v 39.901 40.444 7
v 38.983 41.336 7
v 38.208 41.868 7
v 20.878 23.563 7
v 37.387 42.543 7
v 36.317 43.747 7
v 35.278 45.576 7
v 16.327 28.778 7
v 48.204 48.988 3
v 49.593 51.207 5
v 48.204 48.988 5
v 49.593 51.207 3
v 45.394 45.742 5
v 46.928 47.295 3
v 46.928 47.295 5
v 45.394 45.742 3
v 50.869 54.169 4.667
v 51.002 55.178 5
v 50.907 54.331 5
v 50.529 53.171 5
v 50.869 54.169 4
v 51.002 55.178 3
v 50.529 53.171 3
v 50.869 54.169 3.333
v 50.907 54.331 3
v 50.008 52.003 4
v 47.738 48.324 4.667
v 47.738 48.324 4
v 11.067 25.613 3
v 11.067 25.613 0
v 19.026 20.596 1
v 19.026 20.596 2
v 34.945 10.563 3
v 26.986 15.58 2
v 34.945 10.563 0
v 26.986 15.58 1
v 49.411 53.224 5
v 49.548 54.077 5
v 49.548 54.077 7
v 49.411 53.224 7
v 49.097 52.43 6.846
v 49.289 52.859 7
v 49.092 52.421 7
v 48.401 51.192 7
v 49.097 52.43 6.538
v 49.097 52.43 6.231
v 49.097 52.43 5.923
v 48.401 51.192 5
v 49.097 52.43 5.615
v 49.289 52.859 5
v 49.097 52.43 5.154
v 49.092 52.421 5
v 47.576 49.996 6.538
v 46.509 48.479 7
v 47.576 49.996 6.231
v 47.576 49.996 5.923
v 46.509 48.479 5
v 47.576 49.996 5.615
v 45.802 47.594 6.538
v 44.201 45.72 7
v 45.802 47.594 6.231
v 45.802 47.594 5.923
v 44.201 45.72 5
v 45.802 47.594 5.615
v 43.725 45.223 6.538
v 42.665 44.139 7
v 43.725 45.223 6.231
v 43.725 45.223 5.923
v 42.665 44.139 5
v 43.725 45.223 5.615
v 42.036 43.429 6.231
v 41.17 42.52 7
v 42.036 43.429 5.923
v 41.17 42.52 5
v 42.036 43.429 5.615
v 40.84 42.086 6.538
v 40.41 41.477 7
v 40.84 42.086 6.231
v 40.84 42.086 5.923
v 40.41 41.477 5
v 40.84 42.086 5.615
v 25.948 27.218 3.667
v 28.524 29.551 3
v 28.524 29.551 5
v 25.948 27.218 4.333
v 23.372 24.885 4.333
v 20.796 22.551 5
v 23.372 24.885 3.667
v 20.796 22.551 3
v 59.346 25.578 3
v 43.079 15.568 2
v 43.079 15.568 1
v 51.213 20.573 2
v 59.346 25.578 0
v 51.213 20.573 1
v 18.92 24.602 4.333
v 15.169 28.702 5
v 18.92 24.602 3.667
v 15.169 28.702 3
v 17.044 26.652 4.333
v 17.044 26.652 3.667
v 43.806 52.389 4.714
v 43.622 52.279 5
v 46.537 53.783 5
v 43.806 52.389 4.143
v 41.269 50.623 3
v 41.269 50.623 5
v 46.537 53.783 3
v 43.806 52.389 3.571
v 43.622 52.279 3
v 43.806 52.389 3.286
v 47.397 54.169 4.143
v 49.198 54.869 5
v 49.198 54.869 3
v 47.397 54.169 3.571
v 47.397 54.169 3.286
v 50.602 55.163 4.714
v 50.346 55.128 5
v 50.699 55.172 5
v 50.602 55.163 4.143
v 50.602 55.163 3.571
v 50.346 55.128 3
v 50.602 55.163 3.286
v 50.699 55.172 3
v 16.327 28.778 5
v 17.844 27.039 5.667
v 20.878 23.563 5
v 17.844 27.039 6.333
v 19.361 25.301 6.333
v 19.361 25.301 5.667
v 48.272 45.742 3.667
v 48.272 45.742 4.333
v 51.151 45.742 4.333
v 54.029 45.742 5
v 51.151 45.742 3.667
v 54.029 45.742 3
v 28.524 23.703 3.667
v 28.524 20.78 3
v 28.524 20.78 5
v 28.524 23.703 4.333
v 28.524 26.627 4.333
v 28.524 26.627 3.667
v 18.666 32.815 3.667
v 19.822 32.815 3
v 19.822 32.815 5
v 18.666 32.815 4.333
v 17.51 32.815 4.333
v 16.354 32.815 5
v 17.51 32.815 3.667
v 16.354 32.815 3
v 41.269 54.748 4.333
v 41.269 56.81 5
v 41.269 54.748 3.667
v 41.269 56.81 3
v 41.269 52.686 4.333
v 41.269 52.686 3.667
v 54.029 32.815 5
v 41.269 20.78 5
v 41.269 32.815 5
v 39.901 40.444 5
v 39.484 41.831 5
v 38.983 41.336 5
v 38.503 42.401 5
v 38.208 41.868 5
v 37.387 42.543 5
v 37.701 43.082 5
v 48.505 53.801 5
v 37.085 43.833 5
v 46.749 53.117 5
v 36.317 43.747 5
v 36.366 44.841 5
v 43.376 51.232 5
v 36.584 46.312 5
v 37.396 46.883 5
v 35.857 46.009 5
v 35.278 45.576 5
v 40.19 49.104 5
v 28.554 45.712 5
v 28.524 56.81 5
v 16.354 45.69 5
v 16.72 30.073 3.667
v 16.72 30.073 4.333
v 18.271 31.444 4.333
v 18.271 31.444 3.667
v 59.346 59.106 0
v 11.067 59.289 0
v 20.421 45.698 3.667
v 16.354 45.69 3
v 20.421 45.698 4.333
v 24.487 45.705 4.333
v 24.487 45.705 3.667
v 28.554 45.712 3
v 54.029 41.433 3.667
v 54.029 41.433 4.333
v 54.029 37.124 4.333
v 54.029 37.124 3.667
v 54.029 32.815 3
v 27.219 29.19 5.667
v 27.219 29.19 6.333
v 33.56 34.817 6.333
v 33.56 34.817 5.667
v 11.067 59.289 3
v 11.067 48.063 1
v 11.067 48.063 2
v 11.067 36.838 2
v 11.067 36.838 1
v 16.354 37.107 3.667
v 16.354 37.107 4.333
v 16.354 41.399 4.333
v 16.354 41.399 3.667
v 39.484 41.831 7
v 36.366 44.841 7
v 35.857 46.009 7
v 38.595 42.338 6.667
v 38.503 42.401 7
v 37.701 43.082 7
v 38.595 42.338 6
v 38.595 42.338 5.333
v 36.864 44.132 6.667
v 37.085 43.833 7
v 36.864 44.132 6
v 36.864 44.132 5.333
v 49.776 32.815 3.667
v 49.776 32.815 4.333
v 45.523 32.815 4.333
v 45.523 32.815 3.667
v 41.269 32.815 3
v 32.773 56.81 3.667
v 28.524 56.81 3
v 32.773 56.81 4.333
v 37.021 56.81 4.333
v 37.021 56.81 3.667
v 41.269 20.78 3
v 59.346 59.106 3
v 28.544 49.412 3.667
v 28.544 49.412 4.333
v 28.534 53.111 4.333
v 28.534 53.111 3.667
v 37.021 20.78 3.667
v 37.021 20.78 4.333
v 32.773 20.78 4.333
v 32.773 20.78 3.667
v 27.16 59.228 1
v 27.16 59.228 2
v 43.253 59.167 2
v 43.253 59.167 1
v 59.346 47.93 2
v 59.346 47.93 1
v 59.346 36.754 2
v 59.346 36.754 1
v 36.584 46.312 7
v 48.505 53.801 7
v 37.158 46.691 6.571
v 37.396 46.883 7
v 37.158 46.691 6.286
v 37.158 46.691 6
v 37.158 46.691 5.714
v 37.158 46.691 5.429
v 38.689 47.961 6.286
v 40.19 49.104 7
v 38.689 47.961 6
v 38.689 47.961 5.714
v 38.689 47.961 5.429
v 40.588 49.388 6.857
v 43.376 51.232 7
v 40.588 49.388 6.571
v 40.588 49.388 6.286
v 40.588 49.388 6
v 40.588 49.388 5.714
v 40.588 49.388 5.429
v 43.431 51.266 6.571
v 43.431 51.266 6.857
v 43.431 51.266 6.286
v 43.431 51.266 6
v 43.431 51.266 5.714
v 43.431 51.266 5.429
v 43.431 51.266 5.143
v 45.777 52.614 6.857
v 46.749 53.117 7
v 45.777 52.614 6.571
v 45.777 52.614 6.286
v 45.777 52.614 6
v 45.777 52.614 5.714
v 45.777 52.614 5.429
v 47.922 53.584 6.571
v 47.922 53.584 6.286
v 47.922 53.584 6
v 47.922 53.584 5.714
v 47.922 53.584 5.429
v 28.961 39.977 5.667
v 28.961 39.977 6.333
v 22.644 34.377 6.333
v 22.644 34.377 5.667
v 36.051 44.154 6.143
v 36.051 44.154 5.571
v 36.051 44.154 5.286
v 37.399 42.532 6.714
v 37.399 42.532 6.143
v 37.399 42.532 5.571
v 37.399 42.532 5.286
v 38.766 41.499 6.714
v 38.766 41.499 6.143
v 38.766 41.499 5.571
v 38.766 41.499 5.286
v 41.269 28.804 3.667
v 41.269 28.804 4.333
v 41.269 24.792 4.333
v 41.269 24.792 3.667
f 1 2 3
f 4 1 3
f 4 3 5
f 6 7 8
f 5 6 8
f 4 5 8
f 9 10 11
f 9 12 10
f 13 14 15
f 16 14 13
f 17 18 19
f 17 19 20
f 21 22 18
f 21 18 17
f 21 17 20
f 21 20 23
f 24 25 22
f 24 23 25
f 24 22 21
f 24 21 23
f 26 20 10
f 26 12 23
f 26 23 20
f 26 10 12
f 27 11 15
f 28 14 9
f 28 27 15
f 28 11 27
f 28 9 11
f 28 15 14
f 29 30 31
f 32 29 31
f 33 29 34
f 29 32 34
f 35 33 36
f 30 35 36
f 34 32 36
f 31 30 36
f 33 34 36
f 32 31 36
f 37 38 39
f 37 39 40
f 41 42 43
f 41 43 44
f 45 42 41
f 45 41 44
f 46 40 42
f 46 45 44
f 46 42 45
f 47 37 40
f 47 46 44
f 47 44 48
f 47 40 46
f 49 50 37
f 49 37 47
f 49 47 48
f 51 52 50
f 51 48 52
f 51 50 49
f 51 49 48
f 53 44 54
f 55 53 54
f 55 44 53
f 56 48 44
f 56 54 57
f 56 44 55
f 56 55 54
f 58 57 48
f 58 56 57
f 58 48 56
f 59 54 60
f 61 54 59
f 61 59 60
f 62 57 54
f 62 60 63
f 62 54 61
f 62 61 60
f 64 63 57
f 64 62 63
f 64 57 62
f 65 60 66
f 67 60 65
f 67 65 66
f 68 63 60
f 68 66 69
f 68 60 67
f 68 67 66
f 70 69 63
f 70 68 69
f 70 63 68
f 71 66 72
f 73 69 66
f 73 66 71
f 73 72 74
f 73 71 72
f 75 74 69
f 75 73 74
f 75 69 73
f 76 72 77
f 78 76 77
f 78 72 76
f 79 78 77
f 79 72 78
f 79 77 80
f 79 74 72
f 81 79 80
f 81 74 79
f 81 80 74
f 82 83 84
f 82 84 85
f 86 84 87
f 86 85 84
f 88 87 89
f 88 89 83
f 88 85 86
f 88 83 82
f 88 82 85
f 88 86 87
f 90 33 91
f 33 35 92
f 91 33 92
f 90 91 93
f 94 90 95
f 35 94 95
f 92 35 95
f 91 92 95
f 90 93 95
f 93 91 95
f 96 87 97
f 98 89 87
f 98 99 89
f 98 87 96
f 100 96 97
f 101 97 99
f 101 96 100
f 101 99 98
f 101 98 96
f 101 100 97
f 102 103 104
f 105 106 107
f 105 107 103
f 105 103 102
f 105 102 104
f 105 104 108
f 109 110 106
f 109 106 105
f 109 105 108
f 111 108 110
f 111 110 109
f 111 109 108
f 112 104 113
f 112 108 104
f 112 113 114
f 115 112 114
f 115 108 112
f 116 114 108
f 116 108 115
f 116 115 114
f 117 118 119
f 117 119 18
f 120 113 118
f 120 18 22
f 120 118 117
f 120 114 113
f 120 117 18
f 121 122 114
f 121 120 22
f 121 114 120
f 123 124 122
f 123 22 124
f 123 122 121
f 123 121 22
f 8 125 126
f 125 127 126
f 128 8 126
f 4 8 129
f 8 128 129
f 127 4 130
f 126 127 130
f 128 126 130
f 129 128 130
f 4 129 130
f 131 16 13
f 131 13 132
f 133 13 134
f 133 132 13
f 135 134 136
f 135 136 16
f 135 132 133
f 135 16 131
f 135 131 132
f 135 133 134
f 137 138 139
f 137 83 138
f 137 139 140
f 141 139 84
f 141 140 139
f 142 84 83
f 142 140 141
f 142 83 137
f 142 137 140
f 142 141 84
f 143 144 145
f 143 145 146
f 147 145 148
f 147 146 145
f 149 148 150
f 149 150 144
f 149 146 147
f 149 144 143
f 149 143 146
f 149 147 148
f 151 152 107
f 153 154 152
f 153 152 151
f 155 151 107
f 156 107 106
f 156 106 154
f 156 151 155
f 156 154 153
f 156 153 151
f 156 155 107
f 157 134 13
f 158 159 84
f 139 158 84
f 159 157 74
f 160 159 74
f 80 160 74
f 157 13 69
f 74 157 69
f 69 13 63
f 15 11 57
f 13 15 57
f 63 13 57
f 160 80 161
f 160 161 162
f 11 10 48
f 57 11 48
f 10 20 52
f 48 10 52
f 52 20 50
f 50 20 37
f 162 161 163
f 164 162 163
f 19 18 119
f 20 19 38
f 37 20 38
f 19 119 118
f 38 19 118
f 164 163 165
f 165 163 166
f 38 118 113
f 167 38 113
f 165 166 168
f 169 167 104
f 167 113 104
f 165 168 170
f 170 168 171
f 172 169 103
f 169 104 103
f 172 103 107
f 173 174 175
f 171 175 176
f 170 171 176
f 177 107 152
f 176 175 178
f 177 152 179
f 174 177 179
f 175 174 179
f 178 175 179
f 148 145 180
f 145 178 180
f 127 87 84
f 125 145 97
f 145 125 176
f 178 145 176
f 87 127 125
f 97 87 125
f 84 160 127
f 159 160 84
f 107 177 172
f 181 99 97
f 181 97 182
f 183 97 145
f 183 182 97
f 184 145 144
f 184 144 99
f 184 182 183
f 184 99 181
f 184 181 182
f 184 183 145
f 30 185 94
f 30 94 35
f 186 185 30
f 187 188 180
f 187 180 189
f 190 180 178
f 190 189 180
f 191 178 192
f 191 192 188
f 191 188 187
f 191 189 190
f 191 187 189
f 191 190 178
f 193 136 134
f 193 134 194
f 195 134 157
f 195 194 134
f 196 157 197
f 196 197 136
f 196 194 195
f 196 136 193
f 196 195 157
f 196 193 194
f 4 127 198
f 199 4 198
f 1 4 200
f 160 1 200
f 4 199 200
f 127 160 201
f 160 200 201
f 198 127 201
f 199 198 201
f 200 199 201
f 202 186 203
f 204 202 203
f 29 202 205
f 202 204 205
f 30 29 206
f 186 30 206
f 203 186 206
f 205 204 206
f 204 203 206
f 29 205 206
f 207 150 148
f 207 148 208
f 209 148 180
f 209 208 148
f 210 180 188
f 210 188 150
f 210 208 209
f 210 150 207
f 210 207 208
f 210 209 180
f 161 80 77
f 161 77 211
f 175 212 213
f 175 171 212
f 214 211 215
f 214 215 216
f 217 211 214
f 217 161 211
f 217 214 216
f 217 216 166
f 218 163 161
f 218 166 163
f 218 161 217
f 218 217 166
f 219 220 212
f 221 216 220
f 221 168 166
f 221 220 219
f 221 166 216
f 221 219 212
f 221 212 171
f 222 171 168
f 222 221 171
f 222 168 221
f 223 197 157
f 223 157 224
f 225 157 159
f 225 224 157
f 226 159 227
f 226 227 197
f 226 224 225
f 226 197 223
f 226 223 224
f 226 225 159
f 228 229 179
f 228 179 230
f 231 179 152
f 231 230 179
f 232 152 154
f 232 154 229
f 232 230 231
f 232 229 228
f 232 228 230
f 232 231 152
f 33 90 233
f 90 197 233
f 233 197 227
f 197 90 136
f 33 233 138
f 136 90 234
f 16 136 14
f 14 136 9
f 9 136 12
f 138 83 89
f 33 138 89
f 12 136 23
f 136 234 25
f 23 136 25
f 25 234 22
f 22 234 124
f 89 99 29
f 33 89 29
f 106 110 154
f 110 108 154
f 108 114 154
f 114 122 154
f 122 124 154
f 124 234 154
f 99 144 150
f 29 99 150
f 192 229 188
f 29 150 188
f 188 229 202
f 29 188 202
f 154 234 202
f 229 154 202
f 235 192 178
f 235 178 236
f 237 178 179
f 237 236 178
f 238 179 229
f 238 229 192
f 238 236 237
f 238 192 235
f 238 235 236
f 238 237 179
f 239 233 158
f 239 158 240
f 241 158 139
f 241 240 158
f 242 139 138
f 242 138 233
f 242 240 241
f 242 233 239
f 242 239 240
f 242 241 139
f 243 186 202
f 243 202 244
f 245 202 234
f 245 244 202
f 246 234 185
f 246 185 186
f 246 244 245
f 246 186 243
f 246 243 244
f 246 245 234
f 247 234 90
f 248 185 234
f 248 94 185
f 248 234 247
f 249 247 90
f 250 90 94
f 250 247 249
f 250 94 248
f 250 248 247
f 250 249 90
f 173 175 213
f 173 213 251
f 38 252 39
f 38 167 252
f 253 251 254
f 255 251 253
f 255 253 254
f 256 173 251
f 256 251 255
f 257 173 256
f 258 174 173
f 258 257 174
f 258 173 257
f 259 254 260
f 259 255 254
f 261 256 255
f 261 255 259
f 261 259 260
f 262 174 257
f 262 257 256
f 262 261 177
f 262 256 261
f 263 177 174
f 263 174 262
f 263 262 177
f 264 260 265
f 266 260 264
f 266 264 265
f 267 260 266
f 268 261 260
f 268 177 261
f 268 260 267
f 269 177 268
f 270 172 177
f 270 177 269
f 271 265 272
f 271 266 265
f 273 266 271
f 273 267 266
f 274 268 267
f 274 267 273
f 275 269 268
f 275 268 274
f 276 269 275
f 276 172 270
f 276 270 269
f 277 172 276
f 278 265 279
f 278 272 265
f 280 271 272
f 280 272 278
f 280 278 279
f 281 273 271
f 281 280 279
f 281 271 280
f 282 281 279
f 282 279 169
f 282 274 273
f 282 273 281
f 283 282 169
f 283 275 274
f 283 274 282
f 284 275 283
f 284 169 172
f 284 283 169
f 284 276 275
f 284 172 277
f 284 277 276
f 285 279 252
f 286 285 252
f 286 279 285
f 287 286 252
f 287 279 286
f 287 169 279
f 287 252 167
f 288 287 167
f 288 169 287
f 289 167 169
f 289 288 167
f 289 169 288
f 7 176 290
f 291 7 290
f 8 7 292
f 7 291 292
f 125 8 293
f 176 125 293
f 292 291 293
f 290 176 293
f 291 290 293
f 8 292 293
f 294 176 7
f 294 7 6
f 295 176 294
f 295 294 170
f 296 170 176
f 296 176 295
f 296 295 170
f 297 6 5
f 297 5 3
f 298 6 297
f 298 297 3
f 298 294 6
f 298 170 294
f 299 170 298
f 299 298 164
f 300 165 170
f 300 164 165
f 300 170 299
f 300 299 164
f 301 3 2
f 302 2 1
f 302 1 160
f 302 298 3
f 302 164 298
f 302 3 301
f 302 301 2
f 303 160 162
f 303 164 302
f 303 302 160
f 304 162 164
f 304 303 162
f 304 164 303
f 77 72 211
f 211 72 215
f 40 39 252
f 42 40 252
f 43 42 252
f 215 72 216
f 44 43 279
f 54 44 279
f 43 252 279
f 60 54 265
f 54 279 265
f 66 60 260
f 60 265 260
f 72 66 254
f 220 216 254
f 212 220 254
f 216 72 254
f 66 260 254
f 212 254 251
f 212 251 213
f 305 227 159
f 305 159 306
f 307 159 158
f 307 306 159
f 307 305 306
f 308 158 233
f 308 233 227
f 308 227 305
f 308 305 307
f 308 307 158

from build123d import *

# Parameters (mm, degrees)
F1_DEPTH = 3
F3_DEPTH = 2
F5_DEPTH = 2


with BuildPart() as f1:
    # F0 (on Top) → F1 (new body)
    with BuildSketch(Plane.XY):
        with BuildLine():
            add(Edge.make_bspline(
                [(11.0671931449, 59.2885849332), (27.1602265797, 59.2278252135), (43.2532600144, 59.1670654938), (59.3462934492, 59.106305774)],
                knots=[0, 0, 0, 0, 48.2794444032, 48.2794444032, 48.2794444032, 48.2794444032], degree=3))
            add(Edge.make_bspline(
                [(11.0671931449, 59.2885849332), (11.0671931449, 48.0633100955), (11.0671931449, 36.8380352577), (11.0671931449, 25.61276042)],
                knots=[0, 0, 0, 0, 33.6758245133, 33.6758245133, 33.6758245133, 33.6758245133], degree=3))
            add(Edge.make_bspline(
                [(11.0671931449, 25.61276042), (19.0264820309, 20.5963245083), (26.9857709169, 15.5798885967), (34.9450598029, 10.563452685)],
                knots=[0, 0, 0, 0, 28.2247086688, 28.2247086688, 28.2247086688, 28.2247086688], degree=3))
            add(Edge.make_bspline(
                [(34.9450598029, 10.563452685), (43.0788043517, 15.5682044628), (51.2125489004, 20.5729562405), (59.3462934492, 25.5777080183)],
                knots=[0, 0, 0, 0, 28.6504461864, 28.6504461864, 28.6504461864, 28.6504461864], degree=3))
            add(Edge.make_bspline(
                [(59.3462934492, 59.106305774), (59.3462934492, 47.9301065221), (59.3462934492, 36.7539072702), (59.3462934492, 25.5777080183)],
                knots=[0, 0, 0, 0, 33.5285977557, 33.5285977557, 33.5285977557, 33.5285977557], degree=3))
        make_face()
    extrude(amount=F1_DEPTH)

    # F2 (on face) → F3 (join)
    with BuildSketch(Plane.XY.offset(3)):
        with BuildLine():
            add(Edge.make_bspline(
                [(28.5541154444, 45.7122586668), (28.5442241778, 49.4115737577), (28.5343329112, 53.1108888487), (28.5244416445, 56.8102039397)],
                knots=[0, 0, 0, 0, 11.0979849439, 11.0979849439, 11.0979849439, 11.0979849439], degree=3))
            add(Edge.make_bspline(
                [(16.3540448993, 45.6901788712), (20.420735081, 45.697538803), (24.4874252627, 45.7048987349), (28.5541154444, 45.7122586668)],
                knots=[0, 0, 0, 0, 12.2000905252, 12.2000905252, 12.2000905252, 12.2000905252], degree=3))
            add(Edge.make_bspline(
                [(16.3540448993, 32.8154563904), (16.3540448993, 37.1070305506), (16.3540448993, 41.3986047109), (16.3540448993, 45.6901788712)],
                knots=[0, 0, 0, 0, 12.8747224808, 12.8747224808, 12.8747224808, 12.8747224808], degree=3))
            add(Edge.make_bspline(
                [(19.8224373162, 32.8154563904), (18.6663065106, 32.8154563904), (17.510175705, 32.8154563904), (16.3540448993, 32.8154563904)],
                knots=[0, 0, 0, 0, 3.4683924168, 3.4683924168, 3.4683924168, 3.4683924168], degree=3))
            add(Edge.make_bspline(
                [(15.1688018814, 28.7022646517), (16.720013693, 30.0733285646), (18.2712255046, 31.4443924775), (19.8224373162, 32.8154563904)],
                knots=[0, 0, 0, 0, 6.2108509111, 6.2108509111, 6.2108509111, 6.2108509111], degree=3))
            add(Edge.make_bspline(
                [(20.795583725, 22.5514788181), (18.9199897771, 24.6017407626), (17.0443958292, 26.6520027071), (15.1688018814, 28.7022646517)],
                knots=[0, 0, 0, 0, 8.3362365781, 8.3362365781, 8.3362365781, 8.3362365781], degree=3))
            add(Edge.make_bspline(
                [(28.5244416445, 29.5506473631), (25.9481556714, 27.2175911814), (23.3718696982, 24.8845349997), (20.795583725, 22.5514788181)],
                knots=[0, 0, 0, 0, 10.4270611901, 10.4270611901, 10.4270611901, 10.4270611901], degree=3))
            add(Edge.make_bspline(
                [(28.5244416445, 20.7798555493), (28.5244416445, 23.7034528206), (28.5244416445, 26.6270500918), (28.5244416445, 29.5506473631)],
                knots=[0, 0, 0, 0, 8.7707918137, 8.7707918137, 8.7707918137, 8.7707918137], degree=3))
            add(Edge.make_bspline(
                [(41.2692762911, 20.7798555493), (37.0209980756, 20.7798555493), (32.7727198601, 20.7798555493), (28.5244416445, 20.7798555493)],
                knots=[0, 0, 0, 0, 12.7448346466, 12.7448346466, 12.7448346466, 12.7448346466], degree=3))
            add(Edge.make_bspline(
                [(41.2692762911, 32.8154563904), (41.2692762911, 28.8035894434), (41.2692762911, 24.7917224964), (41.2692762911, 20.7798555493)],
                knots=[0, 0, 0, 0, 12.035600841, 12.035600841, 12.035600841, 12.035600841], degree=3))
            add(Edge.make_bspline(
                [(54.0289506316, 32.8154563904), (49.7757258515, 32.8154563904), (45.5225010713, 32.8154563904), (41.2692762911, 32.8154563904)],
                knots=[0, 0, 0, 0, 12.7596743405, 12.7596743405, 12.7596743405, 12.7596743405], degree=3))
            add(Edge.make_bspline(
                [(54.0289506316, 45.741930604), (54.0289506316, 41.4331058661), (54.0289506316, 37.1242811282), (54.0289506316, 32.8154563904)],
                knots=[0, 0, 0, 0, 12.9264742136, 12.9264742136, 12.9264742136, 12.9264742136], degree=3))
            add(Edge.make_bspline(
                [(45.3939139843, 45.741930604), (48.2722595334, 45.741930604), (51.1506050825, 45.741930604), (54.0289506316, 45.741930604)],
                knots=[0, 0, 0, 0, 8.6350366473, 8.6350366473, 8.6350366473, 8.6350366473], degree=3))
            add(Edge.make_bspline(
                [(51.0022379458, 55.1781579852), (50.9871454202, 54.8760789501), (50.9492122653, 54.1168414871), (50.0167587141, 51.9122681359), (49.0410576538, 50.2362012588), (47.7624509616, 48.3038639045), (46.6810870919, 46.9612553645), (45.8234568907, 46.148831819), (45.3939139843, 45.741930604)],
                knots=[0, 0, 0, 0, 0.1242508102, 0.3122887025, 0.4890354969, 0.6744951269, 0.8369713321, 1, 1, 1, 1], degree=3))
            add(Edge.make_bspline(
                [(41.2692762911, 50.6232492626), (41.4681483995, 50.7946102801), (41.978340298, 51.2342244804), (43.8428750945, 52.4530570659), (45.578161279, 53.3564511541), (47.4048472329, 54.1737185126), (48.9800400423, 54.873378879), (50.5615877202, 55.1869726946), (50.8911084003, 55.1803810061), (51.0022379458, 55.1781579852)],
                knots=[0, 0, 0, 0, 0.1115801276, 0.2862506845, 0.4549970621, 0.6198962034, 0.7787875681, 0.9253969827, 1, 1, 1, 1], degree=3))
            add(Edge.make_bspline(
                [(41.2692762911, 56.8102039397), (41.2692762911, 54.747885714), (41.2692762911, 52.6855674883), (41.2692762911, 50.6232492626)],
                knots=[0, 0, 0, 0, 6.1869546771, 6.1869546771, 6.1869546771, 6.1869546771], degree=3))
            add(Edge.make_bspline(
                [(28.5244416445, 56.8102039397), (32.7727198601, 56.8102039397), (37.0209980756, 56.8102039397), (41.2692762911, 56.8102039397)],
                knots=[0, 0, 0, 0, 12.7448346466, 12.7448346466, 12.7448346466, 12.7448346466], degree=3))
        make_face()
    extrude(amount=F3_DEPTH)

    # F4 (on face) → F5 (join)
    with BuildSketch(Plane.XY.offset(5)):
        with BuildLine():
            add(Edge.make_bspline(
                [(35.8568057418, 46.0094958544), (36.0317157188, 46.0701763186), (36.4297957335, 46.2003354626), (37.1864233034, 46.6726155181), (37.9859530046, 47.4123252193), (38.684220276, 47.9579062137), (39.5978366881, 48.6639690688), (40.5662368593, 49.3935938732), (42.4270495168, 50.6239095496), (43.3956261519, 51.2641930678), (44.5928458585, 51.9136521572), (45.7614362272, 52.6214397624), (46.8939566816, 53.2129220638), (47.9158808974, 53.5753203598), (48.6666958305, 53.8767219281), (49.2486495268, 54.0088859734), (49.547854811, 54.0772415698)],
                knots=[0, 0, 0, 0, 0.0516585621, 0.1154304858, 0.1859697061, 0.2500607567, 0.3209142372, 0.3972341946, 0.4974503857, 0.5717078044, 0.6492089827, 0.7288579814, 0.8055285067, 0.875409065, 0.9359621135, 1, 1, 1, 1], degree=3))
            add(Edge.make_bspline(
                [(40.4100008309, 41.4772853255), (40.1427297174, 41.566451955), (39.5698749881, 41.7575669795), (38.5611360167, 42.3172730775), (37.6153225158, 43.08896958), (36.8712828684, 44.1355753724), (36.2520137722, 44.9300470977), (35.9912628327, 45.6422473966), (35.8568057418, 46.0094958544)],
                knots=[0, 0, 0, 0, 0.1480795284, 0.3173858074, 0.4935656147, 0.672152309, 0.8309442455, 1, 1, 1, 1], degree=3))
            add(Edge.make_bspline(
                [(49.547854811, 54.0772415698), (49.5152026803, 53.7874605081), (49.4499641664, 53.2084818803), (49.0989835668, 52.4043858786), (48.5064178832, 51.2917469226), (47.5589183385, 49.9971352805), (46.7794034559, 48.7976853557), (45.7999311462, 47.5884183596), (44.7693780121, 46.3288788388), (43.750268148, 45.2259326502), (42.7729784172, 44.2975083271), (42.0764861952, 43.4341941921), (41.2224654547, 42.6219891367), (40.8459045869, 42.0950296588), (40.5585529156, 41.6878070457), (40.4100008309, 41.4772853255)],
                knots=[0, 0, 0, 0, 0.0655087235, 0.1308855405, 0.2100996498, 0.2998368838, 0.3845870022, 0.4724072264, 0.5628018265, 0.6497017278, 0.7310722295, 0.8063658322, 0.8820915946, 0.9390449363, 1, 1, 1, 1], degree=3))
        make_face()
        with BuildLine():
            add(Edge.make_bspline(
                [(35.27790308, 45.5761998892), (35.3882946215, 45.3549721851), (35.6258414072, 44.8973547708), (36.0486432773, 44.1340473188), (36.5594531624, 43.374918294), (37.3854774785, 42.5244904822), (38.0605965058, 41.9367271606), (38.8257774231, 41.5003145811), (39.4865628498, 40.9239153063), (39.9012565613, 40.4437407851)],
                knots=[0, 0, 0, 0, 0.1253693984, 0.2588600966, 0.3975887681, 0.5542344561, 0.6898015766, 0.8208467818, 1, 1, 1, 1], degree=3))
            add(Edge.make_bspline(
                [(35.27790308, 45.5761998892), (28.9609463265, 39.9766570578), (22.6439895729, 34.3771142264), (16.3270328194, 28.777571395)],
                knots=[0, 0, 0, 0, 25.3244822833, 25.3244822833, 25.3244822833, 25.3244822833], degree=3))
            add(Edge.make_bspline(
                [(16.3270328194, 28.777571395), (17.8440753371, 27.0394521455), (19.3611178547, 25.301332896), (20.8781603724, 23.5632136464)],
                knots=[0, 0, 0, 0, 6.9211479347, 6.9211479347, 6.9211479347, 6.9211479347], degree=3))
            add(Edge.make_bspline(
                [(20.8781603724, 23.5632136464), (27.2191924353, 29.190056026), (33.5602244983, 34.8168984056), (39.9012565613, 40.4437407851)],
                knots=[0, 0, 0, 0, 25.4328603404, 25.4328603404, 25.4328603404, 25.4328603404], degree=3))
        make_face()
    extrude(amount=F5_DEPTH)


solid = f1.part
